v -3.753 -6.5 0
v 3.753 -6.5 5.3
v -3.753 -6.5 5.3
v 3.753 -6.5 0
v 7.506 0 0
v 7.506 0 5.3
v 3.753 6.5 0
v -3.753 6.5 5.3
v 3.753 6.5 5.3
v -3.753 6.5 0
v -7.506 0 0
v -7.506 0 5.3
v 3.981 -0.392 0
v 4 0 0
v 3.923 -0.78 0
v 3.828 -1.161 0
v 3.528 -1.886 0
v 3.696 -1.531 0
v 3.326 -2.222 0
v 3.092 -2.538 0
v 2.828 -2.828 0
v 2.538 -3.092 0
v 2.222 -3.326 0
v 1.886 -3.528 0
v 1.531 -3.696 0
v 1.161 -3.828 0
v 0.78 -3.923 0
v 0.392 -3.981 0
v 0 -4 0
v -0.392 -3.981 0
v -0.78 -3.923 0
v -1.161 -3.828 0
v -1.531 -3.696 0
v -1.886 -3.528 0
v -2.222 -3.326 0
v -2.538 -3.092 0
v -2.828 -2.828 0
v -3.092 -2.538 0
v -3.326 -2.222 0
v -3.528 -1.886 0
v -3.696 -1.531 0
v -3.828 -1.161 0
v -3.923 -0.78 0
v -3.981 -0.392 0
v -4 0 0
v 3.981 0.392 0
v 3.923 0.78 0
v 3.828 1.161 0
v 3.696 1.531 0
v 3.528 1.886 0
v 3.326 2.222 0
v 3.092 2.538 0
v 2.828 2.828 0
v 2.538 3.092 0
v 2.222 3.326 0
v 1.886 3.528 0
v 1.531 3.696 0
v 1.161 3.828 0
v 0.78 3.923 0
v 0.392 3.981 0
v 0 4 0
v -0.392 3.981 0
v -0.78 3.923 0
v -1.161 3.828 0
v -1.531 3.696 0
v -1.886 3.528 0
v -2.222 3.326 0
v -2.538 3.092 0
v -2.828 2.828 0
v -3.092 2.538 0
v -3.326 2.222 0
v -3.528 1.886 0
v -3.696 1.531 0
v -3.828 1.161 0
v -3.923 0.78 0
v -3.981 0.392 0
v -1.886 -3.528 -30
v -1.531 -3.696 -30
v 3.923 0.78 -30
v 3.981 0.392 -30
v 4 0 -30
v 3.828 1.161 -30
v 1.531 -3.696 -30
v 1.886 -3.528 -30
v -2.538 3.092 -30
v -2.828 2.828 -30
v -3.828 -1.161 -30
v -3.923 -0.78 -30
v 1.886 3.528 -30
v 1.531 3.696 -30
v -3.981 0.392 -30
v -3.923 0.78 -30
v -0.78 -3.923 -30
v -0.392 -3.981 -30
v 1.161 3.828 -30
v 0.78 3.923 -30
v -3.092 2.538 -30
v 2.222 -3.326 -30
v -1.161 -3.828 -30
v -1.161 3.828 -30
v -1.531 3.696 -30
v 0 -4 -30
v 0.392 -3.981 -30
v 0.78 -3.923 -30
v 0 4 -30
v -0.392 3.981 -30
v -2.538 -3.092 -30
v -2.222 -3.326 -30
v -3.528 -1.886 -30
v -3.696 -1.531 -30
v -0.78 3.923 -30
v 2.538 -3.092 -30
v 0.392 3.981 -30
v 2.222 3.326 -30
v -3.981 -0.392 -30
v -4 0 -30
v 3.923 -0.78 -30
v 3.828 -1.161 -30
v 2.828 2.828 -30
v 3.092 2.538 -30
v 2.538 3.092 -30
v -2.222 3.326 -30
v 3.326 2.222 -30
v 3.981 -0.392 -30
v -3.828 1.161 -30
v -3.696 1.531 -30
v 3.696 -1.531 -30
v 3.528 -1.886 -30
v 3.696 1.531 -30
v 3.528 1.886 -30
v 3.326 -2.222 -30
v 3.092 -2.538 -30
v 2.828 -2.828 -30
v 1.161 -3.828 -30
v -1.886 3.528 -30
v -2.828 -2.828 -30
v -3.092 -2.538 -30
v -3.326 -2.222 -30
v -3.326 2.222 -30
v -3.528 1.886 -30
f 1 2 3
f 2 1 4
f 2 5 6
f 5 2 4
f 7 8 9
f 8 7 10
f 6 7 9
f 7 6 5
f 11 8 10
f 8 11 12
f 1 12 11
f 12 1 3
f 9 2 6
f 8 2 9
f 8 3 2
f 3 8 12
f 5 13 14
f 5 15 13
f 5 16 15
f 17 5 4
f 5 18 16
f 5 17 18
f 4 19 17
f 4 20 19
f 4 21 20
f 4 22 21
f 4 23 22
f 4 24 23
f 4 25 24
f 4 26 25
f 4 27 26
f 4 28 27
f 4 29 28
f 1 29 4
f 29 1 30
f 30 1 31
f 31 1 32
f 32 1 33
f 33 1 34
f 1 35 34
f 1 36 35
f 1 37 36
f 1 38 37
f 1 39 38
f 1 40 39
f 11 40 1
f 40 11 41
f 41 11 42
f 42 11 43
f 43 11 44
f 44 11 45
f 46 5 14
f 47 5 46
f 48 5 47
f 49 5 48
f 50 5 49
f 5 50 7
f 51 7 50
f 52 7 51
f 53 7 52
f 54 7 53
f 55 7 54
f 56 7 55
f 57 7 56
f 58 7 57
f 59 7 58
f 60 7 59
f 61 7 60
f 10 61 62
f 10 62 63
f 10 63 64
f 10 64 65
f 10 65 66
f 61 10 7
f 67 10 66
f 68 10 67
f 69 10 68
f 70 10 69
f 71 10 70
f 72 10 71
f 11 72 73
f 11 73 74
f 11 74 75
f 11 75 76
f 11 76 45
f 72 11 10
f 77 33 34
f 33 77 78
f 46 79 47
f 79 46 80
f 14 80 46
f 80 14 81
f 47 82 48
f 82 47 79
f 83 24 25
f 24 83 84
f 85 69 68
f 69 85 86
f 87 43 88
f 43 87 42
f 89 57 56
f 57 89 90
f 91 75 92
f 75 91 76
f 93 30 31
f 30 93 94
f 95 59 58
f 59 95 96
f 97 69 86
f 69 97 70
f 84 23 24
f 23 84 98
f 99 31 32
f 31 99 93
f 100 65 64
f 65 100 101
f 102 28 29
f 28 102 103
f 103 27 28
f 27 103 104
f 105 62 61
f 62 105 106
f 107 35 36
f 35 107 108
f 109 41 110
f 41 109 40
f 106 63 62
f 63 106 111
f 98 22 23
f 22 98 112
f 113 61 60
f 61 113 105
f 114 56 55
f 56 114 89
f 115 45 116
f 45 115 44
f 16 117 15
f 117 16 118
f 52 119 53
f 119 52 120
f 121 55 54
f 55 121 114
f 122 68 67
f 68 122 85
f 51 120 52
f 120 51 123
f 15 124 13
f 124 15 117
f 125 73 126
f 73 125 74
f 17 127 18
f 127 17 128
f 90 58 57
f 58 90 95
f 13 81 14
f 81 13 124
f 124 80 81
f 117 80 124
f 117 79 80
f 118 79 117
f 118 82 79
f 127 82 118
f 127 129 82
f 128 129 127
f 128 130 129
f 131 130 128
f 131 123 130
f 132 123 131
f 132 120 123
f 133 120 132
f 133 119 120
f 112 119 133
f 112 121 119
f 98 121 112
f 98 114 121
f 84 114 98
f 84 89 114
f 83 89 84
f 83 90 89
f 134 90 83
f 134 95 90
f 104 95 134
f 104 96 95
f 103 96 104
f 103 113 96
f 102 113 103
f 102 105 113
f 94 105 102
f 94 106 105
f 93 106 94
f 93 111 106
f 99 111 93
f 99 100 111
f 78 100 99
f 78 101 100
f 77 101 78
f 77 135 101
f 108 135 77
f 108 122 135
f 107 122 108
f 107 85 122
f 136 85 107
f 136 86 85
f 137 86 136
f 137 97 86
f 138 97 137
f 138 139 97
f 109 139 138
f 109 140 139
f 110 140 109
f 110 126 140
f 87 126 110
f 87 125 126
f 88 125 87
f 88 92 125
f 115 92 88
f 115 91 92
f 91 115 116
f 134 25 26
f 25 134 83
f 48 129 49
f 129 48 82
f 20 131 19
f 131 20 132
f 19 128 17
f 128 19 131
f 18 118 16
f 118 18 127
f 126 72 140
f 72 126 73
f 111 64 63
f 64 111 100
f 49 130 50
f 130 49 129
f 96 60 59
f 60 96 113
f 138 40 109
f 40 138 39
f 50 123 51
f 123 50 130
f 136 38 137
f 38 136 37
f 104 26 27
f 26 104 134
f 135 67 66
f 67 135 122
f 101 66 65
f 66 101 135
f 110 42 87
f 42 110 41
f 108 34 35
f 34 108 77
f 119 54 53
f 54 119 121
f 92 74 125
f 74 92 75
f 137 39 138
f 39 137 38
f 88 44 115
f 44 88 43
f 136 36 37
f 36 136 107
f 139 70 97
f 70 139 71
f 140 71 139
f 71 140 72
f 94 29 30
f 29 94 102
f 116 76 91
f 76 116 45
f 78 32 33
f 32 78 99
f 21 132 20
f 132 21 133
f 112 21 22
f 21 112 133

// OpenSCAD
// M8 六角ボルト (ねじ山省略モデル)

$fn = 64;

// 頭部 (対辺距離 13mm, 高さ 5.3mm)
// cylinderのrは外接円半径 = 対辺 / sqrt(3)
module bolt_head() {
    cylinder(d = 13 / cos(180/6), h = 5.3, $fn = 6);
}

// シャンク (直径 8mm, 長さ 30mm)
module shank() {
    translate([0, 0, -30])
    cylinder(d = 8, h = 30);
}

union() {
    bolt_head();
    shank();
}
